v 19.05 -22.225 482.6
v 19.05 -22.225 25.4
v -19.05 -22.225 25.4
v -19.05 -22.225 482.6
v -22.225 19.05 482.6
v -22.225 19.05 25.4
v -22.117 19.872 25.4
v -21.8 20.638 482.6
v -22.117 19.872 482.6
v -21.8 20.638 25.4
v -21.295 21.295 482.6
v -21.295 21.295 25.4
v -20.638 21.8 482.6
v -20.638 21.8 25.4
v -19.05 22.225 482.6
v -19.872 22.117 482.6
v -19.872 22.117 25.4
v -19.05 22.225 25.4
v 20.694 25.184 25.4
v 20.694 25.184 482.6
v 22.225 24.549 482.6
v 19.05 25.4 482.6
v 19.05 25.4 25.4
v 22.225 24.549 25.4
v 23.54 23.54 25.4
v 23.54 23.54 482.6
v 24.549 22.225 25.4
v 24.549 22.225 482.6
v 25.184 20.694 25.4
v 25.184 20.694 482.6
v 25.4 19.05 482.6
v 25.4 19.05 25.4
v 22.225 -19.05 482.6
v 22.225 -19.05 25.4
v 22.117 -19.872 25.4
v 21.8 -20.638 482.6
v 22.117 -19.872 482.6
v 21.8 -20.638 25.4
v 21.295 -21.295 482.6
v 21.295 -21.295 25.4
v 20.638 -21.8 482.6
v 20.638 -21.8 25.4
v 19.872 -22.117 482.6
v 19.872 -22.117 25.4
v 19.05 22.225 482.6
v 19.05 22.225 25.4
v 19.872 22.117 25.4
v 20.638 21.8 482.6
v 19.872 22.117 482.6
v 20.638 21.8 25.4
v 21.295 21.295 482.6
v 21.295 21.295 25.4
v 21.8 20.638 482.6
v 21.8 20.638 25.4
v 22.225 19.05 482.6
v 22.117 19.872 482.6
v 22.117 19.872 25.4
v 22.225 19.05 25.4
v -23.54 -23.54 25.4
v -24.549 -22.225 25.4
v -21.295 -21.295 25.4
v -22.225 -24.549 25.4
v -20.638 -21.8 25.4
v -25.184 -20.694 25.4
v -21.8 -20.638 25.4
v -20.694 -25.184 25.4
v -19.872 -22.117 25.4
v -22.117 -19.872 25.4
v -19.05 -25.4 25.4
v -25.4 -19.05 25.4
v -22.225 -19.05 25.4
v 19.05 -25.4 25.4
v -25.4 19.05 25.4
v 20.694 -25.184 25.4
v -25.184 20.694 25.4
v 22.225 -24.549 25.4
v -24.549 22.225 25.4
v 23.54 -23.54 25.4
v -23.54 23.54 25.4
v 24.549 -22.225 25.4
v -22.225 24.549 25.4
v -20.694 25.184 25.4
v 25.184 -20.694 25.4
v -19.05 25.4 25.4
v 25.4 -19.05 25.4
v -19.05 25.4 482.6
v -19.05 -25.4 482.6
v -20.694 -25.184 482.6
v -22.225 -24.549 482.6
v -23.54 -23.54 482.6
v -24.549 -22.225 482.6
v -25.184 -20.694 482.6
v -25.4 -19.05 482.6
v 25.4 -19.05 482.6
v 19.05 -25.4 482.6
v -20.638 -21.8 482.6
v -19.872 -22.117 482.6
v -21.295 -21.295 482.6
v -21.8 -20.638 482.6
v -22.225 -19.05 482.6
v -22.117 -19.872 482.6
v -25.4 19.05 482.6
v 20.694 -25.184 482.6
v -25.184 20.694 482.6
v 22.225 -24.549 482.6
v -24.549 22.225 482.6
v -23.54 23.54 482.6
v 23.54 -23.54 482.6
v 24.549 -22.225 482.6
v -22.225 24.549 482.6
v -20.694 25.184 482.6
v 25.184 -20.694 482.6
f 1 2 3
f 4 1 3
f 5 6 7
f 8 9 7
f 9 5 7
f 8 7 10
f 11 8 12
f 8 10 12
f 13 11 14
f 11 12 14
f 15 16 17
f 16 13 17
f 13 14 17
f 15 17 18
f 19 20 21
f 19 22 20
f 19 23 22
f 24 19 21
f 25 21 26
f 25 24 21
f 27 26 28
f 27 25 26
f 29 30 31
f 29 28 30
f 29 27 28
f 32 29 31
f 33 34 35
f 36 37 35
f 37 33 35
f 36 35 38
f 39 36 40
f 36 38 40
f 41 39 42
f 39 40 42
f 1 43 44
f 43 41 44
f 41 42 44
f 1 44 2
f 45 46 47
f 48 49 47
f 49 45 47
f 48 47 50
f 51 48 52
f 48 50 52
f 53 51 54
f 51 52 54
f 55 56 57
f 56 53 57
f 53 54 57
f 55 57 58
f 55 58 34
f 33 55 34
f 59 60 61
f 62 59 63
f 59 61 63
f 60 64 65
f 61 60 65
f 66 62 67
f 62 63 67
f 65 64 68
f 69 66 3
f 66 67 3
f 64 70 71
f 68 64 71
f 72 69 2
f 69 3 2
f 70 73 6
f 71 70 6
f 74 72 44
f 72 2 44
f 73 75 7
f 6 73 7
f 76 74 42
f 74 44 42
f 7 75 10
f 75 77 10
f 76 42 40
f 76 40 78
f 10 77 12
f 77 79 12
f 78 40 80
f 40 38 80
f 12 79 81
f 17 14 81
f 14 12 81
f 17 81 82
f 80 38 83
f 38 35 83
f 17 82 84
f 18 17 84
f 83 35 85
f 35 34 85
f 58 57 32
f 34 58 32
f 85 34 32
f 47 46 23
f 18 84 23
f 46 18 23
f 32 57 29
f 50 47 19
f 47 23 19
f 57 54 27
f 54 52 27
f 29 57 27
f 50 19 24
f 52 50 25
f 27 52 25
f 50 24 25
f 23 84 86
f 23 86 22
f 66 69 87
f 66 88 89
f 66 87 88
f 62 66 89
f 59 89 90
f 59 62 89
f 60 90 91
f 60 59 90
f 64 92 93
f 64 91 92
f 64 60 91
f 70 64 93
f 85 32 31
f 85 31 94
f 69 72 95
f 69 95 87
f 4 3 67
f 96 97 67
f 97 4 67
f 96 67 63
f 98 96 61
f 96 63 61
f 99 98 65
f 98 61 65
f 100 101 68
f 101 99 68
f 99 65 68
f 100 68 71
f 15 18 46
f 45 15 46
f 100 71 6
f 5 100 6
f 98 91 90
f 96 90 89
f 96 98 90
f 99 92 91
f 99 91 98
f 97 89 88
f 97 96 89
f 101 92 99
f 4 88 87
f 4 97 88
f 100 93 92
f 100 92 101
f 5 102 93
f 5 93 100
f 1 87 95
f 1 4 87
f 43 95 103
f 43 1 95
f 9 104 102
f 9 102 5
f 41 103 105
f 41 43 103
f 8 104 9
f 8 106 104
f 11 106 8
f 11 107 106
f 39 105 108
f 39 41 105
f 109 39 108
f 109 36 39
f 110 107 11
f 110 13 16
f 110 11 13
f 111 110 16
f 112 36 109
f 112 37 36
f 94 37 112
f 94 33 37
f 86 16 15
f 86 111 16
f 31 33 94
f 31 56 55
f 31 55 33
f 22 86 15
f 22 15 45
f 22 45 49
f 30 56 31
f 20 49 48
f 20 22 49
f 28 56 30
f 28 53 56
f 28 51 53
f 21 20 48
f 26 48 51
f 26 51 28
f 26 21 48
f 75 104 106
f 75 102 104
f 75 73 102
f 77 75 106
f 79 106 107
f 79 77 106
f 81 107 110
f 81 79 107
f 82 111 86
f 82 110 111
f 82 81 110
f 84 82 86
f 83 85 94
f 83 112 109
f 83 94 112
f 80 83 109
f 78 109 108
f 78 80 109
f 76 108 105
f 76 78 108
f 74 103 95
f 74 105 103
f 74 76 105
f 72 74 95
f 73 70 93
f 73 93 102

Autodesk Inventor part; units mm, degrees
ref_plane "YZ Plane" through (0, 0, 0) normal (1, 0, 0) x (0, 1, 0)
ref_plane "Start Plane" through (0, 0, 25.4) normal (0, 0, 1) x (1, 0, 0)
ref_plane "End Plane" through (0, 0, 482.6) normal (0, 0, 1) x (1, 0, 0)
sketch "Sketch" plane through (0, 0, 0) normal (0, 0, 1) x (1, 0, 0)
  line L0 (-25.4, -19.05) -> (-25.4, 19.05)
  line L1 (-19.05, 25.4) -> (19.05, 25.4)
  line L2 (25.4, 19.05) -> (25.4, -19.05)
  line L3 (19.05, -25.4) -> (-19.05, -25.4)
  arc A0 (-25.4, -19.05) -> (-19.05, -25.4) centre (-19.05, -19.05) ccw
  arc A1 (-19.05, 25.4) -> (-25.4, 19.05) centre (-19.05, 19.05) ccw
  arc A2 (25.4, 19.05) -> (19.05, 25.4) centre (19.05, 19.05) ccw
  arc A3 (19.05, -25.4) -> (25.4, -19.05) centre (19.05, -19.05) ccw
  arc A4 (-19.05, 22.225) -> (-22.225, 19.05) centre (-19.05, 19.05) ccw
  line L4 (-19.05, 22.225) -> (19.05, 22.225)
  arc A5 (22.225, 19.05) -> (19.05, 22.225) centre (19.05, 19.05) ccw
  line L5 (22.225, 19.05) -> (22.225, -19.05)
  arc A6 (19.05, -22.225) -> (22.225, -19.05) centre (19.05, -19.05) ccw
  line L6 (19.05, -22.225) -> (-19.05, -22.225)
  arc A7 (-22.225, -19.05) -> (-19.05, -22.225) centre (-19.05, -19.05) ccw
  line L7 (-22.225, -19.05) -> (-22.225, 19.05)
  line L8 (0, 37.4012) -> (0, -37.4012) construction
  line L9 (-37.4012, 0) -> (37.4012, 0) construction
  dimension "d10" = 50.8
  dimension "d11" = 50.8
  dimension "d12" = 3.175
  dimension "d15" = 25.4
  dimension "d16" = 25.4
  dimension "d17" = 6.35
extrude "Body" add sketch "Sketch" along normal up to surface (457.2 mm away) from surface at 25.4
sketch "Sketch3" plane through (0, 0, 0) normal (0, 0, 1) x (1, 0, 0)
  line L0 (0, 0) -> (10, 0)
ref_plane "Work Plane3" through (0, 0, 0) normal (0, -1, 0) x (1, 0, 0)
sketch "Sketch4" plane through (0, 0, 0) normal (0, -1, 0) x (1, 0, 0)
  line L0 (-2, 25.4) -> (12, 25.4)
  line L1 (-2, 482.6) -> (12, 482.6)
  dimension "d19" = 457.2
equation "\"d10\" = G_H"
equation "\"d11\" = G_W"
equation "\"d12\" = G_T"
equation "\"d15\" = 0.5 * d10"
equation "\"d16\" = 0.5 * d11"
equation "\"d17\" = G_IR"
equation "\"d3\" = G_L"
equation "\"G_W\" = 50.8"
equation "\"G_H\" = 50.8"
equation "\"G_T\" = 3.175"
equation "\"G_IR\" = 6.35"
equation "\"G_L\" = d19"
equation "\"G_OFFSET_START\" = -25.4"
equation "\"G_OFFSET_END\" = -25.4"
equation "\"d13\" = -G_OFFSET_START"
equation "\"d14\" = G_OFFSET_END + B_L"
equation "\"B_L\" = 508"
properties part number "AISC - 2 x 2 x 1/8 - 18" material "Steel, Mild"
